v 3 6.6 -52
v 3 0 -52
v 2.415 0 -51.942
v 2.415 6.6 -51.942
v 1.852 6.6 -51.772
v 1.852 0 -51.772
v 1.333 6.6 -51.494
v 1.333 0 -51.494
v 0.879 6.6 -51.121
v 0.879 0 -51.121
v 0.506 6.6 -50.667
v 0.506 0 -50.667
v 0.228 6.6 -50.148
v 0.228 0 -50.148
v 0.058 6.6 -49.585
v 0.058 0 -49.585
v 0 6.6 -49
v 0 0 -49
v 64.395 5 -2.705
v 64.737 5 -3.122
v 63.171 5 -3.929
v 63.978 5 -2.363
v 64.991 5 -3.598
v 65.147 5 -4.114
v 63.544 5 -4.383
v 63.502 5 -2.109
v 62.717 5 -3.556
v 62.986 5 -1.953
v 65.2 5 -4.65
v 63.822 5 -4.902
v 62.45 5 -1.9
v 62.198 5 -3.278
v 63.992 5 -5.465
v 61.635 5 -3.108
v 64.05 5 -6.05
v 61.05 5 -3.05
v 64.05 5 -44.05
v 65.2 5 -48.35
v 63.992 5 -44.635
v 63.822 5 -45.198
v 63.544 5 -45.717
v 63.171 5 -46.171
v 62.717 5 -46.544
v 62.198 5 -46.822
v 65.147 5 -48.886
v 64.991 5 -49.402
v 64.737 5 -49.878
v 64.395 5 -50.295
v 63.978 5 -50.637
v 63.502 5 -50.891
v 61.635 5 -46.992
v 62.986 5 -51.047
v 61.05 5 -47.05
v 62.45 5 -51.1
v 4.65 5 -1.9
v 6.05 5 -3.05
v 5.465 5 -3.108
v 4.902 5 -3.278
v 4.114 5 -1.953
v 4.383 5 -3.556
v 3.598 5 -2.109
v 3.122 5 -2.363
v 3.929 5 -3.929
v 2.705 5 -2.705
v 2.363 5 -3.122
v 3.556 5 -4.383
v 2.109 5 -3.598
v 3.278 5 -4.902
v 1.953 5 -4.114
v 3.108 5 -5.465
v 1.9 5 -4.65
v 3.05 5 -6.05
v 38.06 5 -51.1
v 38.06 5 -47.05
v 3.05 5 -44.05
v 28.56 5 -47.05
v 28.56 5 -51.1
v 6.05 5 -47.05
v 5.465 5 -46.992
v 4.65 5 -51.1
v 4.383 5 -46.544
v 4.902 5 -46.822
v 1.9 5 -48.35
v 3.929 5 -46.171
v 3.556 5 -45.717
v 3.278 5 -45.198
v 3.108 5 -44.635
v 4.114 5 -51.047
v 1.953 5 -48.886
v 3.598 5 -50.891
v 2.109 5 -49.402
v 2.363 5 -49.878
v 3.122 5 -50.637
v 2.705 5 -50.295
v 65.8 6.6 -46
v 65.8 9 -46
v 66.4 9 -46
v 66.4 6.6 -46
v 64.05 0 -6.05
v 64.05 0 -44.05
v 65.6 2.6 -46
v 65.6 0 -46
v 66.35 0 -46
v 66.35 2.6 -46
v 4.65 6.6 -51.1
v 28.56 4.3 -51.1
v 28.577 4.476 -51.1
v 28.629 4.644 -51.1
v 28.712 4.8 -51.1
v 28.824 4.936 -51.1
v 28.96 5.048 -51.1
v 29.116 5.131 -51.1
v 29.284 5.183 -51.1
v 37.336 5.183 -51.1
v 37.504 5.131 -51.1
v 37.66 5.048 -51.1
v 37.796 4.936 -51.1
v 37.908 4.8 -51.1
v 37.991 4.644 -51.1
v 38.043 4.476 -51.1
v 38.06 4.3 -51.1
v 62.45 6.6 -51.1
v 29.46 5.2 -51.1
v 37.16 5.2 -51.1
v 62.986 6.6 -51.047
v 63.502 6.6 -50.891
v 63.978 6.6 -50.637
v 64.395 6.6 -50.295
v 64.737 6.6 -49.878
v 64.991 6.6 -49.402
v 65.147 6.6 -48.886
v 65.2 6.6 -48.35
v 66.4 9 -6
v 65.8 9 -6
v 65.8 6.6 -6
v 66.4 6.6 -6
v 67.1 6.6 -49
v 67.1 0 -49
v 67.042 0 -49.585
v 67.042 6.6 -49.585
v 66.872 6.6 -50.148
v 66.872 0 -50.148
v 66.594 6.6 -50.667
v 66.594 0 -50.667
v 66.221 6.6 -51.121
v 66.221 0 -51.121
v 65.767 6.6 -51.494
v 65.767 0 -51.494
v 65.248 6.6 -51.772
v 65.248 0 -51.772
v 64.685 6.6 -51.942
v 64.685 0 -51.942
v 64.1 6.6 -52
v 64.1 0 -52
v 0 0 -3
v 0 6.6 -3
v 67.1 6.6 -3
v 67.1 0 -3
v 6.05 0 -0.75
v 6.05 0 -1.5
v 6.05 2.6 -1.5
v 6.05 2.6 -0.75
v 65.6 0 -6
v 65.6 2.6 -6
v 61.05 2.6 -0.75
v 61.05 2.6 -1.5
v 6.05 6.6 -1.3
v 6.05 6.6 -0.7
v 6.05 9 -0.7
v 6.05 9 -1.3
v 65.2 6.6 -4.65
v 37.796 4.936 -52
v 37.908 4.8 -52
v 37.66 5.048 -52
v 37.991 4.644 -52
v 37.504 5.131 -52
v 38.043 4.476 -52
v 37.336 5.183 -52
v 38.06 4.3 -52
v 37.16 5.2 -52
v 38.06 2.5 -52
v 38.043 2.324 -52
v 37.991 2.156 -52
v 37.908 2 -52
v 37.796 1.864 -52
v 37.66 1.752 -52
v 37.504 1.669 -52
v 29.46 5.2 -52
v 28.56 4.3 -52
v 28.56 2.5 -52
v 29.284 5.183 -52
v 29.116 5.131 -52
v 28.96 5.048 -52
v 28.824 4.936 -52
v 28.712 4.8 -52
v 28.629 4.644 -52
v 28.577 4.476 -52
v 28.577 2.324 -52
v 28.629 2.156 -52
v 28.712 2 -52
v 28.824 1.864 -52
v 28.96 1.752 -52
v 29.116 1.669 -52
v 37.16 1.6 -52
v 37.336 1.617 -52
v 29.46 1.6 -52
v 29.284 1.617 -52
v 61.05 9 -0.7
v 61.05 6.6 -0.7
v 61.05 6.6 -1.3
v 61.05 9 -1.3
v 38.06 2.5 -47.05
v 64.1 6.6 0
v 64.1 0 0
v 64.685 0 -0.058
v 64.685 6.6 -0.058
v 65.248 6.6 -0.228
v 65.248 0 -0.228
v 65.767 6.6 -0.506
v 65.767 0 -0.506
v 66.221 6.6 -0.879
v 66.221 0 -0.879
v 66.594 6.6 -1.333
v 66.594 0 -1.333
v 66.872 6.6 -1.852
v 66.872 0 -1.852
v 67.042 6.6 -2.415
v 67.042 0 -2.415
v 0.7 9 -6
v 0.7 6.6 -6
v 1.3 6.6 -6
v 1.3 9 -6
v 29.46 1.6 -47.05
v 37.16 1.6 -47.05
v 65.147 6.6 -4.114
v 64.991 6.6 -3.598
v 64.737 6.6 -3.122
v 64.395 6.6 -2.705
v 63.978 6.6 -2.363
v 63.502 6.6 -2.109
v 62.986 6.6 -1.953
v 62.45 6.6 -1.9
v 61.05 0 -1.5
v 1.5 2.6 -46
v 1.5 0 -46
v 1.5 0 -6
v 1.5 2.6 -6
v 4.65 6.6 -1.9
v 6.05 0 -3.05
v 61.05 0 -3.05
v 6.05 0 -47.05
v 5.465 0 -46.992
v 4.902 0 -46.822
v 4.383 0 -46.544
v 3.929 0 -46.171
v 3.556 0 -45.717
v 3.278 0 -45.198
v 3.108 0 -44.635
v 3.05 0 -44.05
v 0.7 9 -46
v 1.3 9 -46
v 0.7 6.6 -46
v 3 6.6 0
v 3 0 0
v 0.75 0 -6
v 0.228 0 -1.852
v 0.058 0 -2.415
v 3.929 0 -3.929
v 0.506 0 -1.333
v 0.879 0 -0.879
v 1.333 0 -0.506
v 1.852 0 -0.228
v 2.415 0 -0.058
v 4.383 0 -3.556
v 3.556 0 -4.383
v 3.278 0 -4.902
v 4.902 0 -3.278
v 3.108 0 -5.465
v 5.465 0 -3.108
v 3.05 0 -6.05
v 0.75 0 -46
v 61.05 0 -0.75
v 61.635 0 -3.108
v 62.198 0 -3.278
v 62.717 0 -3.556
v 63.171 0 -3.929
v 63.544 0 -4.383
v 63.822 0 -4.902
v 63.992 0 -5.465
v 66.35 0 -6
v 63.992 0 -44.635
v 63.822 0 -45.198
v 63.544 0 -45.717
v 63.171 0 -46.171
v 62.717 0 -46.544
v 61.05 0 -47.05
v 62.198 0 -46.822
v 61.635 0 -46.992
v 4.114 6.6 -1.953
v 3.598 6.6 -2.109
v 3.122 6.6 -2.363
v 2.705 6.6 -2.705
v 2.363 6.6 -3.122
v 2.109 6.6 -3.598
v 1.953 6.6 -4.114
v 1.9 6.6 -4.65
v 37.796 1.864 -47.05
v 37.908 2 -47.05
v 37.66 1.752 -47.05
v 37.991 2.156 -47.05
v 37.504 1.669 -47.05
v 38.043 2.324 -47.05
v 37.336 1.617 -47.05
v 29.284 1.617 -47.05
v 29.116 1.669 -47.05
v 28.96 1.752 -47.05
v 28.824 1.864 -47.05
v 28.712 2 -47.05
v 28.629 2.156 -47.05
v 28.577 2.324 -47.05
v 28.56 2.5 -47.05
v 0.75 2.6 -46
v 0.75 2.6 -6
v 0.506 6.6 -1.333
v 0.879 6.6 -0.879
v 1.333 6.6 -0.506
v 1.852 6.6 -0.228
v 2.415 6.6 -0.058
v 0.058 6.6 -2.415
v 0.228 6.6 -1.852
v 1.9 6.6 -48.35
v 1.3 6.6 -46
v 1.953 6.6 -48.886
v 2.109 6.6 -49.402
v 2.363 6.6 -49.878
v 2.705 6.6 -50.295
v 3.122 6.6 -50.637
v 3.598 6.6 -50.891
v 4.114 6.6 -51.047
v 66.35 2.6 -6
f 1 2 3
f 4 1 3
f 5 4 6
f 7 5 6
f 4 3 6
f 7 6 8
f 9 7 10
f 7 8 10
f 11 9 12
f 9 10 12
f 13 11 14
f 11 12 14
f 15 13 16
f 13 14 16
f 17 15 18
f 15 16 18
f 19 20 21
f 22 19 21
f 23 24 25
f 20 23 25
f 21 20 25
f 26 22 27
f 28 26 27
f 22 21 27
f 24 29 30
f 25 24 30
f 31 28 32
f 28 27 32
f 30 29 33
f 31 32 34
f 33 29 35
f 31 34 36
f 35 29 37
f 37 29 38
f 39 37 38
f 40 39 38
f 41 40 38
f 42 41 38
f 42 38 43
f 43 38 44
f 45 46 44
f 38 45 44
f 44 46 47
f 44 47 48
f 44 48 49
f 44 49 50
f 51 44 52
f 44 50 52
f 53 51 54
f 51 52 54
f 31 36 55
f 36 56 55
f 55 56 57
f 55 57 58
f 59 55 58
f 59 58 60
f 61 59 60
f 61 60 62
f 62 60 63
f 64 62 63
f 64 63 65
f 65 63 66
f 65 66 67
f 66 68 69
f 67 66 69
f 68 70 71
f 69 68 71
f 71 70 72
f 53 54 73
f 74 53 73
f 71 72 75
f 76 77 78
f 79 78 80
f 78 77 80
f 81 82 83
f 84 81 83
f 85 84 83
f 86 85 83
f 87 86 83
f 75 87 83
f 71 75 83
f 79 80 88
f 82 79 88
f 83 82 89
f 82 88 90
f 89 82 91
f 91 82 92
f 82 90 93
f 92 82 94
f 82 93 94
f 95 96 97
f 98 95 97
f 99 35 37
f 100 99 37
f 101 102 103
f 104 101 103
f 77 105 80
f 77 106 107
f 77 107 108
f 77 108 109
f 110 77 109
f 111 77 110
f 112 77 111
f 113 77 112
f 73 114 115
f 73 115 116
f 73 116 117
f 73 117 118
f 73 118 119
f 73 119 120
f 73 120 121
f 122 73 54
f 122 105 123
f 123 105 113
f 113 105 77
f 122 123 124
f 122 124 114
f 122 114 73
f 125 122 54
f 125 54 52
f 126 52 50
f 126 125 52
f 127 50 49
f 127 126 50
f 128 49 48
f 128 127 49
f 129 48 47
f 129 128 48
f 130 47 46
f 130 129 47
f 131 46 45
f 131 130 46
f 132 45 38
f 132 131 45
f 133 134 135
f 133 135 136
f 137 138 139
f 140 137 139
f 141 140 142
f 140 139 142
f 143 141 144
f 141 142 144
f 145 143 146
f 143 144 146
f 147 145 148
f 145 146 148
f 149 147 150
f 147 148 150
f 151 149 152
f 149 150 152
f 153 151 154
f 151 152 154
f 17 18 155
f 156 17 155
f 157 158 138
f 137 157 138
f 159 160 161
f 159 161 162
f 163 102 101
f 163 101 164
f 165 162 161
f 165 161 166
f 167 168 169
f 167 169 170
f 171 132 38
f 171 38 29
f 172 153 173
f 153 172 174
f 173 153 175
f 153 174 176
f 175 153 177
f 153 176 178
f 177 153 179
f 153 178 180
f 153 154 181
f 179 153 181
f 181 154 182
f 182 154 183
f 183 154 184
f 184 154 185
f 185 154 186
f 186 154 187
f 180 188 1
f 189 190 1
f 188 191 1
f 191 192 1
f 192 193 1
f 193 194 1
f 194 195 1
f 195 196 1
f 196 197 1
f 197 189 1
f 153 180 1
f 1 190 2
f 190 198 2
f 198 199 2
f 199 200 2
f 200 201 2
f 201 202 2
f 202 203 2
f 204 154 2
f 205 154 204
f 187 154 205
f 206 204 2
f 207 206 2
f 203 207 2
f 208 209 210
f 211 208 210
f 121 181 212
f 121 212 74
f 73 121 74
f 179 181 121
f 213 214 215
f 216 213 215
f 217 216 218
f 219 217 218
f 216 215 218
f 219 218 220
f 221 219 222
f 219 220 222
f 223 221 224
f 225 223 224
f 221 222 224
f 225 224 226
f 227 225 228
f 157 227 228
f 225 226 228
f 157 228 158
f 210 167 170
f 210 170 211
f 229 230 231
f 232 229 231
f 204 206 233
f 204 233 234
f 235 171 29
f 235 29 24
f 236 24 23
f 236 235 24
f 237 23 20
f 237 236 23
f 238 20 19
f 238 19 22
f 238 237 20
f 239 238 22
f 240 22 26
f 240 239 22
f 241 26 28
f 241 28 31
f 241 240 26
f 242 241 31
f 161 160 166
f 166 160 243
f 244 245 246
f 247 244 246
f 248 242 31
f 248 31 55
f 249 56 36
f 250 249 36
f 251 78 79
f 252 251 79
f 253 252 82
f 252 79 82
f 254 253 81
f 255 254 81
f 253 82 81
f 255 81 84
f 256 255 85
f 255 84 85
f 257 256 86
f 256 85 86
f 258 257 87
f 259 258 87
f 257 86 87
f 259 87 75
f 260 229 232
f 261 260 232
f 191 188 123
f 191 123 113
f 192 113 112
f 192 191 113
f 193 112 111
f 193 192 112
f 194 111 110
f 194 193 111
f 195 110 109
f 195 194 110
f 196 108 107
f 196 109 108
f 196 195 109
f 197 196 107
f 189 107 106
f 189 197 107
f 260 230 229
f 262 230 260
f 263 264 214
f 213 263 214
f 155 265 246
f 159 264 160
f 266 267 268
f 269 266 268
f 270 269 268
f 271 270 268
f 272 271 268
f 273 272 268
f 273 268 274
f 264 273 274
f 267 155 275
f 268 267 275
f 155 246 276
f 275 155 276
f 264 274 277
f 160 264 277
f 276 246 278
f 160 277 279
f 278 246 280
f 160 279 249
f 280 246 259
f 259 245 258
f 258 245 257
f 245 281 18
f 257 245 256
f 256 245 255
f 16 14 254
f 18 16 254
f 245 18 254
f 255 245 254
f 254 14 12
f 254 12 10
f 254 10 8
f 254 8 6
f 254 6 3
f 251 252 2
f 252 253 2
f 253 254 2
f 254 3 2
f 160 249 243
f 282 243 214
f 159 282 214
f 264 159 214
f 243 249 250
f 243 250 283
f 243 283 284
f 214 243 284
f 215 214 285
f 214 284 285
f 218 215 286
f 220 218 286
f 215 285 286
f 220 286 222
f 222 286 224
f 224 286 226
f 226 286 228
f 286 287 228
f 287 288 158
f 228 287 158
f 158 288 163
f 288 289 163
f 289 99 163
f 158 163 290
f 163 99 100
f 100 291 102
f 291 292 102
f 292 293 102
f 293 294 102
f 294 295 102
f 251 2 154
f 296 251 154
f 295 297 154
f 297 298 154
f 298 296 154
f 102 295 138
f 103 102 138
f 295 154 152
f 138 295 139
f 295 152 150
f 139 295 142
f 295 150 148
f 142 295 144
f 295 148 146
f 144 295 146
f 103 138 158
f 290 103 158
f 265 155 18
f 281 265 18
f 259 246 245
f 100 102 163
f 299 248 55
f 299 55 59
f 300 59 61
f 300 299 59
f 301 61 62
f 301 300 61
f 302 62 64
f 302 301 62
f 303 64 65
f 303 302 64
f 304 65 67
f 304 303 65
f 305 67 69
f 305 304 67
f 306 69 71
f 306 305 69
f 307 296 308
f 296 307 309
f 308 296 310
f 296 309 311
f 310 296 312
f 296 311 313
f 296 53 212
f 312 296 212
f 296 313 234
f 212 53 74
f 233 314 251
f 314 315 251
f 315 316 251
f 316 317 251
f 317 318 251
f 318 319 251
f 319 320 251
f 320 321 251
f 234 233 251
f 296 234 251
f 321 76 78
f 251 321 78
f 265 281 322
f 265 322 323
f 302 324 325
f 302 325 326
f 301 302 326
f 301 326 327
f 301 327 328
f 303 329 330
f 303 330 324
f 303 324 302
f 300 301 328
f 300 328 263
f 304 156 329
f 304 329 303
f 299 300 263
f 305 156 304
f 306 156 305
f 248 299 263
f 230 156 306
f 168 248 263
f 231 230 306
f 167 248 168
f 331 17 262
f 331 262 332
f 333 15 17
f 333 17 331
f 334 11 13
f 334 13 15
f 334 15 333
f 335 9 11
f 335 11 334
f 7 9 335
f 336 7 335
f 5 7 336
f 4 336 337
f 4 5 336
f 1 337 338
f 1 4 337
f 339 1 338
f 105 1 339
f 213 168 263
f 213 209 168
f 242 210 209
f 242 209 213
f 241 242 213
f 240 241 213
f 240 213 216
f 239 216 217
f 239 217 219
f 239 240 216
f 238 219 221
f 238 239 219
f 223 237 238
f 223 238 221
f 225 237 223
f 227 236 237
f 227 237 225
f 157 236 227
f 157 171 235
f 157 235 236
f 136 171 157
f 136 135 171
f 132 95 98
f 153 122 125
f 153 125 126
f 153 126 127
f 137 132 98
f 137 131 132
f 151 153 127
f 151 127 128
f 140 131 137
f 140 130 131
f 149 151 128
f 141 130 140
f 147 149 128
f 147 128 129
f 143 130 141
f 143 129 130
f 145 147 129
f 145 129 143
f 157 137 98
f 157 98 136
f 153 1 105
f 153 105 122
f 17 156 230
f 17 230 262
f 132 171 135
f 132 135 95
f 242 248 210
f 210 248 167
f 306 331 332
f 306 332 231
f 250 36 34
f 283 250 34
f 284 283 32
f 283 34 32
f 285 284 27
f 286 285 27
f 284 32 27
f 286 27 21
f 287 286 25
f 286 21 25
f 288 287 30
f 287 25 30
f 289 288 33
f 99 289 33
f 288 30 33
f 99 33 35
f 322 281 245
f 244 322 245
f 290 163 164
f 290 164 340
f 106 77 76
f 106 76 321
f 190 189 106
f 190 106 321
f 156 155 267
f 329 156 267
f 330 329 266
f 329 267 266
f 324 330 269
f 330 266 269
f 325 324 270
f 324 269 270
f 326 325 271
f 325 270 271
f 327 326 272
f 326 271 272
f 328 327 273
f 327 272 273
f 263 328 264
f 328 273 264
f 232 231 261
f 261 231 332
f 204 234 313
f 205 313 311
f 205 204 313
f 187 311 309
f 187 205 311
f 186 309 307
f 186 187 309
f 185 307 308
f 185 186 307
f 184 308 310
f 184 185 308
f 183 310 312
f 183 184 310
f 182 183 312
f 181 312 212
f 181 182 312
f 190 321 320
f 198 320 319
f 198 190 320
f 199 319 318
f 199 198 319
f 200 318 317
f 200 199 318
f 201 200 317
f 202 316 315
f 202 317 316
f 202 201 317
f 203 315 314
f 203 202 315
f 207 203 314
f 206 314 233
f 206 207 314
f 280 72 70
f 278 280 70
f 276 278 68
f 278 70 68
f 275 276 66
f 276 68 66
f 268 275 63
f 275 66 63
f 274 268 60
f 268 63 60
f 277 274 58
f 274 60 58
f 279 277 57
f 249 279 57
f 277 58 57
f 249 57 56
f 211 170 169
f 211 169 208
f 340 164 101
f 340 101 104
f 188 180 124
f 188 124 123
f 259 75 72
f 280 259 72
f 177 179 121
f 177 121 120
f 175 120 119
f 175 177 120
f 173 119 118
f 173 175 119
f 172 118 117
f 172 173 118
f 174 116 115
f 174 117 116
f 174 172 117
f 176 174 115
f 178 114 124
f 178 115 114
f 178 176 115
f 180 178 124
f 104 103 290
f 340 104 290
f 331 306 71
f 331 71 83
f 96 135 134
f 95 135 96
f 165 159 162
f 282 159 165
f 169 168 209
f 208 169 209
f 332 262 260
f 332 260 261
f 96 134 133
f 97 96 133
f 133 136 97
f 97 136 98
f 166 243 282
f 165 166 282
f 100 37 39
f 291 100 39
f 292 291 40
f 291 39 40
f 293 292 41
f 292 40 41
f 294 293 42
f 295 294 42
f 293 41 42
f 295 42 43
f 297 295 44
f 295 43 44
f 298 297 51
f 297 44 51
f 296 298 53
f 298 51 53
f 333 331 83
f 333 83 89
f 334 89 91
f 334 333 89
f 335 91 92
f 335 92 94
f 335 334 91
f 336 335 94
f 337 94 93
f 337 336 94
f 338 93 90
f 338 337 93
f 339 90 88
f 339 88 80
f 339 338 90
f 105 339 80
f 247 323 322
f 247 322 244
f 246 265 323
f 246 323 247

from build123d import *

# Parameters (mm, degrees)
BOSS_EXTRUDE1_DEPTH = 6.6
CUT_EXTRUDE1_DEPTH  = 6.6
CUT_EXTRUDE2_DEPTH  = 1.6
CUT_EXTRUDE3_DEPTH  = 11.6
SKETCH5_W           = 9.5
SKETCH5_H           = 4.05
CUT_EXTRUDE4_DEPTH  = 2
SKETCH6_W           = 0.75
SKETCH6_H           = 40
SKETCH6_W_2         = 55
SKETCH6_H_2         = 0.75
CUT_EXTRUDE5_DEPTH  = 2.6
SKETCH7_W           = 0.6
SKETCH7_H           = 40
SKETCH7_W_2         = 55
SKETCH7_H_2         = 0.6
BOSS_EXTRUDE2_DEPTH = 2.4


with BuildPart() as part:
    # Sketch1 → Boss-Extrude1 (new body)
    with BuildSketch(Plane(origin=(0, 0, 0), x_dir=(1, 0, 0), z_dir=(0, 1, 0))):
        with BuildLine():
            Line((3, 0), (64.1, 0))
            ThreePointArc((64.1, 0), (66.221320344, 0.878679656), (67.1, 3))
            Line((67.1, 3), (67.1, 49))
            ThreePointArc((67.1, 49), (66.221320344, 51.121320344), (64.1, 52))
            Line((64.1, 52), (3, 52))
            ThreePointArc((3, 52), (0.878679656, 51.121320344), (0, 49))
            Line((0, 49), (0, 3))
            ThreePointArc((0, 3), (0.878679656, 0.878679656), (3, 0))
        make_face()
    extrude(amount=BOSS_EXTRUDE1_DEPTH)

    # Sketch2 → Cut-Extrude1 (cut)
    with BuildSketch(Plane(origin=(0, 6.6, 0), x_dir=(1, 0, 0), z_dir=(0, 1, 0))):
        with BuildLine():
            Line((6.05, 3.05), (61.05, 3.05))
            ThreePointArc((61.05, 3.05), (63.171320344, 3.928679656), (64.05, 6.05))
            Line((64.05, 6.05), (64.05, 44.05))
            ThreePointArc((64.05, 44.05), (63.171320344, 46.171320344), (61.05, 47.05))
            Line((61.05, 47.05), (6.05, 47.05))
            ThreePointArc((6.05, 47.05), (3.928679656, 46.171320344), (3.05, 44.05))
            Line((3.05, 44.05), (3.05, 6.05))
            ThreePointArc((3.05, 6.05), (3.928679656, 3.928679656), (6.05, 3.05))
        make_face()
    extrude(amount=-CUT_EXTRUDE1_DEPTH, mode=Mode.SUBTRACT)

    # Sketch3 → Cut-Extrude2 (cut)
    with BuildSketch(Plane(origin=(0, 6.6, 0), x_dir=(1, 0, 0), z_dir=(0, 1, 0))):
        with BuildLine():
            Line((4.65, 51.1), (62.45, 51.1))
            ThreePointArc((62.45, 51.1), (64.394543648, 50.294543648), (65.2, 48.35))
            Line((65.2, 48.35), (65.2, 4.65))
            ThreePointArc((65.2, 4.65), (64.394543648, 2.705456352), (62.45, 1.9))
            Line((62.45, 1.9), (4.65, 1.9))
            ThreePointArc((4.65, 1.9), (2.705456352, 2.705456352), (1.9, 4.65))
            Line((1.9, 4.65), (1.9, 48.35))
            ThreePointArc((1.9, 48.35), (2.705456352, 50.294543648), (4.65, 51.1))
        make_face()
    extrude(amount=-CUT_EXTRUDE2_DEPTH, mode=Mode.SUBTRACT)

    # Sketch4 → Cut-Extrude3 (cut)
    with BuildSketch(Plane(origin=(0, 0, -52), x_dir=(-1, 0, 0), z_dir=(0, 0, -1))):
        with BuildLine():
            Line((-37.16, 5.2), (-29.46, 5.2))
            ThreePointArc((-29.46, 5.2), (-28.823603897, 4.936396103), (-28.56, 4.3))
            Line((-28.56, 4.3), (-28.56, 2.5))
            ThreePointArc((-28.56, 2.5), (-28.823603897, 1.863603897), (-29.46, 1.6))
            Line((-29.46, 1.6), (-37.16, 1.6))
            ThreePointArc((-37.16, 1.6), (-37.796396103, 1.863603897), (-38.06, 2.5))
            Line((-38.06, 2.5), (-38.06, 4.3))
            ThreePointArc((-38.06, 4.3), (-37.796396103, 4.936396103), (-37.16, 5.2))
        make_face()
    extrude(amount=-CUT_EXTRUDE3_DEPTH, mode=Mode.SUBTRACT)

    # Sketch5 → Cut-Extrude4 (cut)
    with BuildSketch(Plane(origin=(0, 5, 0), x_dir=(1, 0, 0), z_dir=(0, 1, 0))):
        with Locations((33.31, 49.075)):
            Rectangle(SKETCH5_W, SKETCH5_H)
    extrude(amount=-CUT_EXTRUDE4_DEPTH, mode=Mode.SUBTRACT)

    # Sketch6 → Cut-Extrude5 (cut)
    with BuildSketch(Plane.XZ):
        with Locations((65.975, -26)):
            Rectangle(SKETCH6_W, SKETCH6_H)
        with Locations((1.125, -26)):
            Rectangle(SKETCH6_W, SKETCH6_H)
        with Locations((33.55, -1.125)):
            Rectangle(SKETCH6_W_2, SKETCH6_H_2)
    extrude(amount=-CUT_EXTRUDE5_DEPTH, mode=Mode.SUBTRACT)

    # Sketch7 → Boss-Extrude2 (add)
    with BuildSketch(Plane(origin=(0, 6.6, 0), x_dir=(1, 0, 0), z_dir=(0, 1, 0))):
        with Locations((1, 26)):
            Rectangle(SKETCH7_W, SKETCH7_H)
        with Locations((33.55, 1)):
            Rectangle(SKETCH7_W_2, SKETCH7_H_2)
        with Locations((66.1, 26)):
            Rectangle(SKETCH7_W, SKETCH7_H)
    extrude(amount=BOSS_EXTRUDE2_DEPTH)


solid = part.part
